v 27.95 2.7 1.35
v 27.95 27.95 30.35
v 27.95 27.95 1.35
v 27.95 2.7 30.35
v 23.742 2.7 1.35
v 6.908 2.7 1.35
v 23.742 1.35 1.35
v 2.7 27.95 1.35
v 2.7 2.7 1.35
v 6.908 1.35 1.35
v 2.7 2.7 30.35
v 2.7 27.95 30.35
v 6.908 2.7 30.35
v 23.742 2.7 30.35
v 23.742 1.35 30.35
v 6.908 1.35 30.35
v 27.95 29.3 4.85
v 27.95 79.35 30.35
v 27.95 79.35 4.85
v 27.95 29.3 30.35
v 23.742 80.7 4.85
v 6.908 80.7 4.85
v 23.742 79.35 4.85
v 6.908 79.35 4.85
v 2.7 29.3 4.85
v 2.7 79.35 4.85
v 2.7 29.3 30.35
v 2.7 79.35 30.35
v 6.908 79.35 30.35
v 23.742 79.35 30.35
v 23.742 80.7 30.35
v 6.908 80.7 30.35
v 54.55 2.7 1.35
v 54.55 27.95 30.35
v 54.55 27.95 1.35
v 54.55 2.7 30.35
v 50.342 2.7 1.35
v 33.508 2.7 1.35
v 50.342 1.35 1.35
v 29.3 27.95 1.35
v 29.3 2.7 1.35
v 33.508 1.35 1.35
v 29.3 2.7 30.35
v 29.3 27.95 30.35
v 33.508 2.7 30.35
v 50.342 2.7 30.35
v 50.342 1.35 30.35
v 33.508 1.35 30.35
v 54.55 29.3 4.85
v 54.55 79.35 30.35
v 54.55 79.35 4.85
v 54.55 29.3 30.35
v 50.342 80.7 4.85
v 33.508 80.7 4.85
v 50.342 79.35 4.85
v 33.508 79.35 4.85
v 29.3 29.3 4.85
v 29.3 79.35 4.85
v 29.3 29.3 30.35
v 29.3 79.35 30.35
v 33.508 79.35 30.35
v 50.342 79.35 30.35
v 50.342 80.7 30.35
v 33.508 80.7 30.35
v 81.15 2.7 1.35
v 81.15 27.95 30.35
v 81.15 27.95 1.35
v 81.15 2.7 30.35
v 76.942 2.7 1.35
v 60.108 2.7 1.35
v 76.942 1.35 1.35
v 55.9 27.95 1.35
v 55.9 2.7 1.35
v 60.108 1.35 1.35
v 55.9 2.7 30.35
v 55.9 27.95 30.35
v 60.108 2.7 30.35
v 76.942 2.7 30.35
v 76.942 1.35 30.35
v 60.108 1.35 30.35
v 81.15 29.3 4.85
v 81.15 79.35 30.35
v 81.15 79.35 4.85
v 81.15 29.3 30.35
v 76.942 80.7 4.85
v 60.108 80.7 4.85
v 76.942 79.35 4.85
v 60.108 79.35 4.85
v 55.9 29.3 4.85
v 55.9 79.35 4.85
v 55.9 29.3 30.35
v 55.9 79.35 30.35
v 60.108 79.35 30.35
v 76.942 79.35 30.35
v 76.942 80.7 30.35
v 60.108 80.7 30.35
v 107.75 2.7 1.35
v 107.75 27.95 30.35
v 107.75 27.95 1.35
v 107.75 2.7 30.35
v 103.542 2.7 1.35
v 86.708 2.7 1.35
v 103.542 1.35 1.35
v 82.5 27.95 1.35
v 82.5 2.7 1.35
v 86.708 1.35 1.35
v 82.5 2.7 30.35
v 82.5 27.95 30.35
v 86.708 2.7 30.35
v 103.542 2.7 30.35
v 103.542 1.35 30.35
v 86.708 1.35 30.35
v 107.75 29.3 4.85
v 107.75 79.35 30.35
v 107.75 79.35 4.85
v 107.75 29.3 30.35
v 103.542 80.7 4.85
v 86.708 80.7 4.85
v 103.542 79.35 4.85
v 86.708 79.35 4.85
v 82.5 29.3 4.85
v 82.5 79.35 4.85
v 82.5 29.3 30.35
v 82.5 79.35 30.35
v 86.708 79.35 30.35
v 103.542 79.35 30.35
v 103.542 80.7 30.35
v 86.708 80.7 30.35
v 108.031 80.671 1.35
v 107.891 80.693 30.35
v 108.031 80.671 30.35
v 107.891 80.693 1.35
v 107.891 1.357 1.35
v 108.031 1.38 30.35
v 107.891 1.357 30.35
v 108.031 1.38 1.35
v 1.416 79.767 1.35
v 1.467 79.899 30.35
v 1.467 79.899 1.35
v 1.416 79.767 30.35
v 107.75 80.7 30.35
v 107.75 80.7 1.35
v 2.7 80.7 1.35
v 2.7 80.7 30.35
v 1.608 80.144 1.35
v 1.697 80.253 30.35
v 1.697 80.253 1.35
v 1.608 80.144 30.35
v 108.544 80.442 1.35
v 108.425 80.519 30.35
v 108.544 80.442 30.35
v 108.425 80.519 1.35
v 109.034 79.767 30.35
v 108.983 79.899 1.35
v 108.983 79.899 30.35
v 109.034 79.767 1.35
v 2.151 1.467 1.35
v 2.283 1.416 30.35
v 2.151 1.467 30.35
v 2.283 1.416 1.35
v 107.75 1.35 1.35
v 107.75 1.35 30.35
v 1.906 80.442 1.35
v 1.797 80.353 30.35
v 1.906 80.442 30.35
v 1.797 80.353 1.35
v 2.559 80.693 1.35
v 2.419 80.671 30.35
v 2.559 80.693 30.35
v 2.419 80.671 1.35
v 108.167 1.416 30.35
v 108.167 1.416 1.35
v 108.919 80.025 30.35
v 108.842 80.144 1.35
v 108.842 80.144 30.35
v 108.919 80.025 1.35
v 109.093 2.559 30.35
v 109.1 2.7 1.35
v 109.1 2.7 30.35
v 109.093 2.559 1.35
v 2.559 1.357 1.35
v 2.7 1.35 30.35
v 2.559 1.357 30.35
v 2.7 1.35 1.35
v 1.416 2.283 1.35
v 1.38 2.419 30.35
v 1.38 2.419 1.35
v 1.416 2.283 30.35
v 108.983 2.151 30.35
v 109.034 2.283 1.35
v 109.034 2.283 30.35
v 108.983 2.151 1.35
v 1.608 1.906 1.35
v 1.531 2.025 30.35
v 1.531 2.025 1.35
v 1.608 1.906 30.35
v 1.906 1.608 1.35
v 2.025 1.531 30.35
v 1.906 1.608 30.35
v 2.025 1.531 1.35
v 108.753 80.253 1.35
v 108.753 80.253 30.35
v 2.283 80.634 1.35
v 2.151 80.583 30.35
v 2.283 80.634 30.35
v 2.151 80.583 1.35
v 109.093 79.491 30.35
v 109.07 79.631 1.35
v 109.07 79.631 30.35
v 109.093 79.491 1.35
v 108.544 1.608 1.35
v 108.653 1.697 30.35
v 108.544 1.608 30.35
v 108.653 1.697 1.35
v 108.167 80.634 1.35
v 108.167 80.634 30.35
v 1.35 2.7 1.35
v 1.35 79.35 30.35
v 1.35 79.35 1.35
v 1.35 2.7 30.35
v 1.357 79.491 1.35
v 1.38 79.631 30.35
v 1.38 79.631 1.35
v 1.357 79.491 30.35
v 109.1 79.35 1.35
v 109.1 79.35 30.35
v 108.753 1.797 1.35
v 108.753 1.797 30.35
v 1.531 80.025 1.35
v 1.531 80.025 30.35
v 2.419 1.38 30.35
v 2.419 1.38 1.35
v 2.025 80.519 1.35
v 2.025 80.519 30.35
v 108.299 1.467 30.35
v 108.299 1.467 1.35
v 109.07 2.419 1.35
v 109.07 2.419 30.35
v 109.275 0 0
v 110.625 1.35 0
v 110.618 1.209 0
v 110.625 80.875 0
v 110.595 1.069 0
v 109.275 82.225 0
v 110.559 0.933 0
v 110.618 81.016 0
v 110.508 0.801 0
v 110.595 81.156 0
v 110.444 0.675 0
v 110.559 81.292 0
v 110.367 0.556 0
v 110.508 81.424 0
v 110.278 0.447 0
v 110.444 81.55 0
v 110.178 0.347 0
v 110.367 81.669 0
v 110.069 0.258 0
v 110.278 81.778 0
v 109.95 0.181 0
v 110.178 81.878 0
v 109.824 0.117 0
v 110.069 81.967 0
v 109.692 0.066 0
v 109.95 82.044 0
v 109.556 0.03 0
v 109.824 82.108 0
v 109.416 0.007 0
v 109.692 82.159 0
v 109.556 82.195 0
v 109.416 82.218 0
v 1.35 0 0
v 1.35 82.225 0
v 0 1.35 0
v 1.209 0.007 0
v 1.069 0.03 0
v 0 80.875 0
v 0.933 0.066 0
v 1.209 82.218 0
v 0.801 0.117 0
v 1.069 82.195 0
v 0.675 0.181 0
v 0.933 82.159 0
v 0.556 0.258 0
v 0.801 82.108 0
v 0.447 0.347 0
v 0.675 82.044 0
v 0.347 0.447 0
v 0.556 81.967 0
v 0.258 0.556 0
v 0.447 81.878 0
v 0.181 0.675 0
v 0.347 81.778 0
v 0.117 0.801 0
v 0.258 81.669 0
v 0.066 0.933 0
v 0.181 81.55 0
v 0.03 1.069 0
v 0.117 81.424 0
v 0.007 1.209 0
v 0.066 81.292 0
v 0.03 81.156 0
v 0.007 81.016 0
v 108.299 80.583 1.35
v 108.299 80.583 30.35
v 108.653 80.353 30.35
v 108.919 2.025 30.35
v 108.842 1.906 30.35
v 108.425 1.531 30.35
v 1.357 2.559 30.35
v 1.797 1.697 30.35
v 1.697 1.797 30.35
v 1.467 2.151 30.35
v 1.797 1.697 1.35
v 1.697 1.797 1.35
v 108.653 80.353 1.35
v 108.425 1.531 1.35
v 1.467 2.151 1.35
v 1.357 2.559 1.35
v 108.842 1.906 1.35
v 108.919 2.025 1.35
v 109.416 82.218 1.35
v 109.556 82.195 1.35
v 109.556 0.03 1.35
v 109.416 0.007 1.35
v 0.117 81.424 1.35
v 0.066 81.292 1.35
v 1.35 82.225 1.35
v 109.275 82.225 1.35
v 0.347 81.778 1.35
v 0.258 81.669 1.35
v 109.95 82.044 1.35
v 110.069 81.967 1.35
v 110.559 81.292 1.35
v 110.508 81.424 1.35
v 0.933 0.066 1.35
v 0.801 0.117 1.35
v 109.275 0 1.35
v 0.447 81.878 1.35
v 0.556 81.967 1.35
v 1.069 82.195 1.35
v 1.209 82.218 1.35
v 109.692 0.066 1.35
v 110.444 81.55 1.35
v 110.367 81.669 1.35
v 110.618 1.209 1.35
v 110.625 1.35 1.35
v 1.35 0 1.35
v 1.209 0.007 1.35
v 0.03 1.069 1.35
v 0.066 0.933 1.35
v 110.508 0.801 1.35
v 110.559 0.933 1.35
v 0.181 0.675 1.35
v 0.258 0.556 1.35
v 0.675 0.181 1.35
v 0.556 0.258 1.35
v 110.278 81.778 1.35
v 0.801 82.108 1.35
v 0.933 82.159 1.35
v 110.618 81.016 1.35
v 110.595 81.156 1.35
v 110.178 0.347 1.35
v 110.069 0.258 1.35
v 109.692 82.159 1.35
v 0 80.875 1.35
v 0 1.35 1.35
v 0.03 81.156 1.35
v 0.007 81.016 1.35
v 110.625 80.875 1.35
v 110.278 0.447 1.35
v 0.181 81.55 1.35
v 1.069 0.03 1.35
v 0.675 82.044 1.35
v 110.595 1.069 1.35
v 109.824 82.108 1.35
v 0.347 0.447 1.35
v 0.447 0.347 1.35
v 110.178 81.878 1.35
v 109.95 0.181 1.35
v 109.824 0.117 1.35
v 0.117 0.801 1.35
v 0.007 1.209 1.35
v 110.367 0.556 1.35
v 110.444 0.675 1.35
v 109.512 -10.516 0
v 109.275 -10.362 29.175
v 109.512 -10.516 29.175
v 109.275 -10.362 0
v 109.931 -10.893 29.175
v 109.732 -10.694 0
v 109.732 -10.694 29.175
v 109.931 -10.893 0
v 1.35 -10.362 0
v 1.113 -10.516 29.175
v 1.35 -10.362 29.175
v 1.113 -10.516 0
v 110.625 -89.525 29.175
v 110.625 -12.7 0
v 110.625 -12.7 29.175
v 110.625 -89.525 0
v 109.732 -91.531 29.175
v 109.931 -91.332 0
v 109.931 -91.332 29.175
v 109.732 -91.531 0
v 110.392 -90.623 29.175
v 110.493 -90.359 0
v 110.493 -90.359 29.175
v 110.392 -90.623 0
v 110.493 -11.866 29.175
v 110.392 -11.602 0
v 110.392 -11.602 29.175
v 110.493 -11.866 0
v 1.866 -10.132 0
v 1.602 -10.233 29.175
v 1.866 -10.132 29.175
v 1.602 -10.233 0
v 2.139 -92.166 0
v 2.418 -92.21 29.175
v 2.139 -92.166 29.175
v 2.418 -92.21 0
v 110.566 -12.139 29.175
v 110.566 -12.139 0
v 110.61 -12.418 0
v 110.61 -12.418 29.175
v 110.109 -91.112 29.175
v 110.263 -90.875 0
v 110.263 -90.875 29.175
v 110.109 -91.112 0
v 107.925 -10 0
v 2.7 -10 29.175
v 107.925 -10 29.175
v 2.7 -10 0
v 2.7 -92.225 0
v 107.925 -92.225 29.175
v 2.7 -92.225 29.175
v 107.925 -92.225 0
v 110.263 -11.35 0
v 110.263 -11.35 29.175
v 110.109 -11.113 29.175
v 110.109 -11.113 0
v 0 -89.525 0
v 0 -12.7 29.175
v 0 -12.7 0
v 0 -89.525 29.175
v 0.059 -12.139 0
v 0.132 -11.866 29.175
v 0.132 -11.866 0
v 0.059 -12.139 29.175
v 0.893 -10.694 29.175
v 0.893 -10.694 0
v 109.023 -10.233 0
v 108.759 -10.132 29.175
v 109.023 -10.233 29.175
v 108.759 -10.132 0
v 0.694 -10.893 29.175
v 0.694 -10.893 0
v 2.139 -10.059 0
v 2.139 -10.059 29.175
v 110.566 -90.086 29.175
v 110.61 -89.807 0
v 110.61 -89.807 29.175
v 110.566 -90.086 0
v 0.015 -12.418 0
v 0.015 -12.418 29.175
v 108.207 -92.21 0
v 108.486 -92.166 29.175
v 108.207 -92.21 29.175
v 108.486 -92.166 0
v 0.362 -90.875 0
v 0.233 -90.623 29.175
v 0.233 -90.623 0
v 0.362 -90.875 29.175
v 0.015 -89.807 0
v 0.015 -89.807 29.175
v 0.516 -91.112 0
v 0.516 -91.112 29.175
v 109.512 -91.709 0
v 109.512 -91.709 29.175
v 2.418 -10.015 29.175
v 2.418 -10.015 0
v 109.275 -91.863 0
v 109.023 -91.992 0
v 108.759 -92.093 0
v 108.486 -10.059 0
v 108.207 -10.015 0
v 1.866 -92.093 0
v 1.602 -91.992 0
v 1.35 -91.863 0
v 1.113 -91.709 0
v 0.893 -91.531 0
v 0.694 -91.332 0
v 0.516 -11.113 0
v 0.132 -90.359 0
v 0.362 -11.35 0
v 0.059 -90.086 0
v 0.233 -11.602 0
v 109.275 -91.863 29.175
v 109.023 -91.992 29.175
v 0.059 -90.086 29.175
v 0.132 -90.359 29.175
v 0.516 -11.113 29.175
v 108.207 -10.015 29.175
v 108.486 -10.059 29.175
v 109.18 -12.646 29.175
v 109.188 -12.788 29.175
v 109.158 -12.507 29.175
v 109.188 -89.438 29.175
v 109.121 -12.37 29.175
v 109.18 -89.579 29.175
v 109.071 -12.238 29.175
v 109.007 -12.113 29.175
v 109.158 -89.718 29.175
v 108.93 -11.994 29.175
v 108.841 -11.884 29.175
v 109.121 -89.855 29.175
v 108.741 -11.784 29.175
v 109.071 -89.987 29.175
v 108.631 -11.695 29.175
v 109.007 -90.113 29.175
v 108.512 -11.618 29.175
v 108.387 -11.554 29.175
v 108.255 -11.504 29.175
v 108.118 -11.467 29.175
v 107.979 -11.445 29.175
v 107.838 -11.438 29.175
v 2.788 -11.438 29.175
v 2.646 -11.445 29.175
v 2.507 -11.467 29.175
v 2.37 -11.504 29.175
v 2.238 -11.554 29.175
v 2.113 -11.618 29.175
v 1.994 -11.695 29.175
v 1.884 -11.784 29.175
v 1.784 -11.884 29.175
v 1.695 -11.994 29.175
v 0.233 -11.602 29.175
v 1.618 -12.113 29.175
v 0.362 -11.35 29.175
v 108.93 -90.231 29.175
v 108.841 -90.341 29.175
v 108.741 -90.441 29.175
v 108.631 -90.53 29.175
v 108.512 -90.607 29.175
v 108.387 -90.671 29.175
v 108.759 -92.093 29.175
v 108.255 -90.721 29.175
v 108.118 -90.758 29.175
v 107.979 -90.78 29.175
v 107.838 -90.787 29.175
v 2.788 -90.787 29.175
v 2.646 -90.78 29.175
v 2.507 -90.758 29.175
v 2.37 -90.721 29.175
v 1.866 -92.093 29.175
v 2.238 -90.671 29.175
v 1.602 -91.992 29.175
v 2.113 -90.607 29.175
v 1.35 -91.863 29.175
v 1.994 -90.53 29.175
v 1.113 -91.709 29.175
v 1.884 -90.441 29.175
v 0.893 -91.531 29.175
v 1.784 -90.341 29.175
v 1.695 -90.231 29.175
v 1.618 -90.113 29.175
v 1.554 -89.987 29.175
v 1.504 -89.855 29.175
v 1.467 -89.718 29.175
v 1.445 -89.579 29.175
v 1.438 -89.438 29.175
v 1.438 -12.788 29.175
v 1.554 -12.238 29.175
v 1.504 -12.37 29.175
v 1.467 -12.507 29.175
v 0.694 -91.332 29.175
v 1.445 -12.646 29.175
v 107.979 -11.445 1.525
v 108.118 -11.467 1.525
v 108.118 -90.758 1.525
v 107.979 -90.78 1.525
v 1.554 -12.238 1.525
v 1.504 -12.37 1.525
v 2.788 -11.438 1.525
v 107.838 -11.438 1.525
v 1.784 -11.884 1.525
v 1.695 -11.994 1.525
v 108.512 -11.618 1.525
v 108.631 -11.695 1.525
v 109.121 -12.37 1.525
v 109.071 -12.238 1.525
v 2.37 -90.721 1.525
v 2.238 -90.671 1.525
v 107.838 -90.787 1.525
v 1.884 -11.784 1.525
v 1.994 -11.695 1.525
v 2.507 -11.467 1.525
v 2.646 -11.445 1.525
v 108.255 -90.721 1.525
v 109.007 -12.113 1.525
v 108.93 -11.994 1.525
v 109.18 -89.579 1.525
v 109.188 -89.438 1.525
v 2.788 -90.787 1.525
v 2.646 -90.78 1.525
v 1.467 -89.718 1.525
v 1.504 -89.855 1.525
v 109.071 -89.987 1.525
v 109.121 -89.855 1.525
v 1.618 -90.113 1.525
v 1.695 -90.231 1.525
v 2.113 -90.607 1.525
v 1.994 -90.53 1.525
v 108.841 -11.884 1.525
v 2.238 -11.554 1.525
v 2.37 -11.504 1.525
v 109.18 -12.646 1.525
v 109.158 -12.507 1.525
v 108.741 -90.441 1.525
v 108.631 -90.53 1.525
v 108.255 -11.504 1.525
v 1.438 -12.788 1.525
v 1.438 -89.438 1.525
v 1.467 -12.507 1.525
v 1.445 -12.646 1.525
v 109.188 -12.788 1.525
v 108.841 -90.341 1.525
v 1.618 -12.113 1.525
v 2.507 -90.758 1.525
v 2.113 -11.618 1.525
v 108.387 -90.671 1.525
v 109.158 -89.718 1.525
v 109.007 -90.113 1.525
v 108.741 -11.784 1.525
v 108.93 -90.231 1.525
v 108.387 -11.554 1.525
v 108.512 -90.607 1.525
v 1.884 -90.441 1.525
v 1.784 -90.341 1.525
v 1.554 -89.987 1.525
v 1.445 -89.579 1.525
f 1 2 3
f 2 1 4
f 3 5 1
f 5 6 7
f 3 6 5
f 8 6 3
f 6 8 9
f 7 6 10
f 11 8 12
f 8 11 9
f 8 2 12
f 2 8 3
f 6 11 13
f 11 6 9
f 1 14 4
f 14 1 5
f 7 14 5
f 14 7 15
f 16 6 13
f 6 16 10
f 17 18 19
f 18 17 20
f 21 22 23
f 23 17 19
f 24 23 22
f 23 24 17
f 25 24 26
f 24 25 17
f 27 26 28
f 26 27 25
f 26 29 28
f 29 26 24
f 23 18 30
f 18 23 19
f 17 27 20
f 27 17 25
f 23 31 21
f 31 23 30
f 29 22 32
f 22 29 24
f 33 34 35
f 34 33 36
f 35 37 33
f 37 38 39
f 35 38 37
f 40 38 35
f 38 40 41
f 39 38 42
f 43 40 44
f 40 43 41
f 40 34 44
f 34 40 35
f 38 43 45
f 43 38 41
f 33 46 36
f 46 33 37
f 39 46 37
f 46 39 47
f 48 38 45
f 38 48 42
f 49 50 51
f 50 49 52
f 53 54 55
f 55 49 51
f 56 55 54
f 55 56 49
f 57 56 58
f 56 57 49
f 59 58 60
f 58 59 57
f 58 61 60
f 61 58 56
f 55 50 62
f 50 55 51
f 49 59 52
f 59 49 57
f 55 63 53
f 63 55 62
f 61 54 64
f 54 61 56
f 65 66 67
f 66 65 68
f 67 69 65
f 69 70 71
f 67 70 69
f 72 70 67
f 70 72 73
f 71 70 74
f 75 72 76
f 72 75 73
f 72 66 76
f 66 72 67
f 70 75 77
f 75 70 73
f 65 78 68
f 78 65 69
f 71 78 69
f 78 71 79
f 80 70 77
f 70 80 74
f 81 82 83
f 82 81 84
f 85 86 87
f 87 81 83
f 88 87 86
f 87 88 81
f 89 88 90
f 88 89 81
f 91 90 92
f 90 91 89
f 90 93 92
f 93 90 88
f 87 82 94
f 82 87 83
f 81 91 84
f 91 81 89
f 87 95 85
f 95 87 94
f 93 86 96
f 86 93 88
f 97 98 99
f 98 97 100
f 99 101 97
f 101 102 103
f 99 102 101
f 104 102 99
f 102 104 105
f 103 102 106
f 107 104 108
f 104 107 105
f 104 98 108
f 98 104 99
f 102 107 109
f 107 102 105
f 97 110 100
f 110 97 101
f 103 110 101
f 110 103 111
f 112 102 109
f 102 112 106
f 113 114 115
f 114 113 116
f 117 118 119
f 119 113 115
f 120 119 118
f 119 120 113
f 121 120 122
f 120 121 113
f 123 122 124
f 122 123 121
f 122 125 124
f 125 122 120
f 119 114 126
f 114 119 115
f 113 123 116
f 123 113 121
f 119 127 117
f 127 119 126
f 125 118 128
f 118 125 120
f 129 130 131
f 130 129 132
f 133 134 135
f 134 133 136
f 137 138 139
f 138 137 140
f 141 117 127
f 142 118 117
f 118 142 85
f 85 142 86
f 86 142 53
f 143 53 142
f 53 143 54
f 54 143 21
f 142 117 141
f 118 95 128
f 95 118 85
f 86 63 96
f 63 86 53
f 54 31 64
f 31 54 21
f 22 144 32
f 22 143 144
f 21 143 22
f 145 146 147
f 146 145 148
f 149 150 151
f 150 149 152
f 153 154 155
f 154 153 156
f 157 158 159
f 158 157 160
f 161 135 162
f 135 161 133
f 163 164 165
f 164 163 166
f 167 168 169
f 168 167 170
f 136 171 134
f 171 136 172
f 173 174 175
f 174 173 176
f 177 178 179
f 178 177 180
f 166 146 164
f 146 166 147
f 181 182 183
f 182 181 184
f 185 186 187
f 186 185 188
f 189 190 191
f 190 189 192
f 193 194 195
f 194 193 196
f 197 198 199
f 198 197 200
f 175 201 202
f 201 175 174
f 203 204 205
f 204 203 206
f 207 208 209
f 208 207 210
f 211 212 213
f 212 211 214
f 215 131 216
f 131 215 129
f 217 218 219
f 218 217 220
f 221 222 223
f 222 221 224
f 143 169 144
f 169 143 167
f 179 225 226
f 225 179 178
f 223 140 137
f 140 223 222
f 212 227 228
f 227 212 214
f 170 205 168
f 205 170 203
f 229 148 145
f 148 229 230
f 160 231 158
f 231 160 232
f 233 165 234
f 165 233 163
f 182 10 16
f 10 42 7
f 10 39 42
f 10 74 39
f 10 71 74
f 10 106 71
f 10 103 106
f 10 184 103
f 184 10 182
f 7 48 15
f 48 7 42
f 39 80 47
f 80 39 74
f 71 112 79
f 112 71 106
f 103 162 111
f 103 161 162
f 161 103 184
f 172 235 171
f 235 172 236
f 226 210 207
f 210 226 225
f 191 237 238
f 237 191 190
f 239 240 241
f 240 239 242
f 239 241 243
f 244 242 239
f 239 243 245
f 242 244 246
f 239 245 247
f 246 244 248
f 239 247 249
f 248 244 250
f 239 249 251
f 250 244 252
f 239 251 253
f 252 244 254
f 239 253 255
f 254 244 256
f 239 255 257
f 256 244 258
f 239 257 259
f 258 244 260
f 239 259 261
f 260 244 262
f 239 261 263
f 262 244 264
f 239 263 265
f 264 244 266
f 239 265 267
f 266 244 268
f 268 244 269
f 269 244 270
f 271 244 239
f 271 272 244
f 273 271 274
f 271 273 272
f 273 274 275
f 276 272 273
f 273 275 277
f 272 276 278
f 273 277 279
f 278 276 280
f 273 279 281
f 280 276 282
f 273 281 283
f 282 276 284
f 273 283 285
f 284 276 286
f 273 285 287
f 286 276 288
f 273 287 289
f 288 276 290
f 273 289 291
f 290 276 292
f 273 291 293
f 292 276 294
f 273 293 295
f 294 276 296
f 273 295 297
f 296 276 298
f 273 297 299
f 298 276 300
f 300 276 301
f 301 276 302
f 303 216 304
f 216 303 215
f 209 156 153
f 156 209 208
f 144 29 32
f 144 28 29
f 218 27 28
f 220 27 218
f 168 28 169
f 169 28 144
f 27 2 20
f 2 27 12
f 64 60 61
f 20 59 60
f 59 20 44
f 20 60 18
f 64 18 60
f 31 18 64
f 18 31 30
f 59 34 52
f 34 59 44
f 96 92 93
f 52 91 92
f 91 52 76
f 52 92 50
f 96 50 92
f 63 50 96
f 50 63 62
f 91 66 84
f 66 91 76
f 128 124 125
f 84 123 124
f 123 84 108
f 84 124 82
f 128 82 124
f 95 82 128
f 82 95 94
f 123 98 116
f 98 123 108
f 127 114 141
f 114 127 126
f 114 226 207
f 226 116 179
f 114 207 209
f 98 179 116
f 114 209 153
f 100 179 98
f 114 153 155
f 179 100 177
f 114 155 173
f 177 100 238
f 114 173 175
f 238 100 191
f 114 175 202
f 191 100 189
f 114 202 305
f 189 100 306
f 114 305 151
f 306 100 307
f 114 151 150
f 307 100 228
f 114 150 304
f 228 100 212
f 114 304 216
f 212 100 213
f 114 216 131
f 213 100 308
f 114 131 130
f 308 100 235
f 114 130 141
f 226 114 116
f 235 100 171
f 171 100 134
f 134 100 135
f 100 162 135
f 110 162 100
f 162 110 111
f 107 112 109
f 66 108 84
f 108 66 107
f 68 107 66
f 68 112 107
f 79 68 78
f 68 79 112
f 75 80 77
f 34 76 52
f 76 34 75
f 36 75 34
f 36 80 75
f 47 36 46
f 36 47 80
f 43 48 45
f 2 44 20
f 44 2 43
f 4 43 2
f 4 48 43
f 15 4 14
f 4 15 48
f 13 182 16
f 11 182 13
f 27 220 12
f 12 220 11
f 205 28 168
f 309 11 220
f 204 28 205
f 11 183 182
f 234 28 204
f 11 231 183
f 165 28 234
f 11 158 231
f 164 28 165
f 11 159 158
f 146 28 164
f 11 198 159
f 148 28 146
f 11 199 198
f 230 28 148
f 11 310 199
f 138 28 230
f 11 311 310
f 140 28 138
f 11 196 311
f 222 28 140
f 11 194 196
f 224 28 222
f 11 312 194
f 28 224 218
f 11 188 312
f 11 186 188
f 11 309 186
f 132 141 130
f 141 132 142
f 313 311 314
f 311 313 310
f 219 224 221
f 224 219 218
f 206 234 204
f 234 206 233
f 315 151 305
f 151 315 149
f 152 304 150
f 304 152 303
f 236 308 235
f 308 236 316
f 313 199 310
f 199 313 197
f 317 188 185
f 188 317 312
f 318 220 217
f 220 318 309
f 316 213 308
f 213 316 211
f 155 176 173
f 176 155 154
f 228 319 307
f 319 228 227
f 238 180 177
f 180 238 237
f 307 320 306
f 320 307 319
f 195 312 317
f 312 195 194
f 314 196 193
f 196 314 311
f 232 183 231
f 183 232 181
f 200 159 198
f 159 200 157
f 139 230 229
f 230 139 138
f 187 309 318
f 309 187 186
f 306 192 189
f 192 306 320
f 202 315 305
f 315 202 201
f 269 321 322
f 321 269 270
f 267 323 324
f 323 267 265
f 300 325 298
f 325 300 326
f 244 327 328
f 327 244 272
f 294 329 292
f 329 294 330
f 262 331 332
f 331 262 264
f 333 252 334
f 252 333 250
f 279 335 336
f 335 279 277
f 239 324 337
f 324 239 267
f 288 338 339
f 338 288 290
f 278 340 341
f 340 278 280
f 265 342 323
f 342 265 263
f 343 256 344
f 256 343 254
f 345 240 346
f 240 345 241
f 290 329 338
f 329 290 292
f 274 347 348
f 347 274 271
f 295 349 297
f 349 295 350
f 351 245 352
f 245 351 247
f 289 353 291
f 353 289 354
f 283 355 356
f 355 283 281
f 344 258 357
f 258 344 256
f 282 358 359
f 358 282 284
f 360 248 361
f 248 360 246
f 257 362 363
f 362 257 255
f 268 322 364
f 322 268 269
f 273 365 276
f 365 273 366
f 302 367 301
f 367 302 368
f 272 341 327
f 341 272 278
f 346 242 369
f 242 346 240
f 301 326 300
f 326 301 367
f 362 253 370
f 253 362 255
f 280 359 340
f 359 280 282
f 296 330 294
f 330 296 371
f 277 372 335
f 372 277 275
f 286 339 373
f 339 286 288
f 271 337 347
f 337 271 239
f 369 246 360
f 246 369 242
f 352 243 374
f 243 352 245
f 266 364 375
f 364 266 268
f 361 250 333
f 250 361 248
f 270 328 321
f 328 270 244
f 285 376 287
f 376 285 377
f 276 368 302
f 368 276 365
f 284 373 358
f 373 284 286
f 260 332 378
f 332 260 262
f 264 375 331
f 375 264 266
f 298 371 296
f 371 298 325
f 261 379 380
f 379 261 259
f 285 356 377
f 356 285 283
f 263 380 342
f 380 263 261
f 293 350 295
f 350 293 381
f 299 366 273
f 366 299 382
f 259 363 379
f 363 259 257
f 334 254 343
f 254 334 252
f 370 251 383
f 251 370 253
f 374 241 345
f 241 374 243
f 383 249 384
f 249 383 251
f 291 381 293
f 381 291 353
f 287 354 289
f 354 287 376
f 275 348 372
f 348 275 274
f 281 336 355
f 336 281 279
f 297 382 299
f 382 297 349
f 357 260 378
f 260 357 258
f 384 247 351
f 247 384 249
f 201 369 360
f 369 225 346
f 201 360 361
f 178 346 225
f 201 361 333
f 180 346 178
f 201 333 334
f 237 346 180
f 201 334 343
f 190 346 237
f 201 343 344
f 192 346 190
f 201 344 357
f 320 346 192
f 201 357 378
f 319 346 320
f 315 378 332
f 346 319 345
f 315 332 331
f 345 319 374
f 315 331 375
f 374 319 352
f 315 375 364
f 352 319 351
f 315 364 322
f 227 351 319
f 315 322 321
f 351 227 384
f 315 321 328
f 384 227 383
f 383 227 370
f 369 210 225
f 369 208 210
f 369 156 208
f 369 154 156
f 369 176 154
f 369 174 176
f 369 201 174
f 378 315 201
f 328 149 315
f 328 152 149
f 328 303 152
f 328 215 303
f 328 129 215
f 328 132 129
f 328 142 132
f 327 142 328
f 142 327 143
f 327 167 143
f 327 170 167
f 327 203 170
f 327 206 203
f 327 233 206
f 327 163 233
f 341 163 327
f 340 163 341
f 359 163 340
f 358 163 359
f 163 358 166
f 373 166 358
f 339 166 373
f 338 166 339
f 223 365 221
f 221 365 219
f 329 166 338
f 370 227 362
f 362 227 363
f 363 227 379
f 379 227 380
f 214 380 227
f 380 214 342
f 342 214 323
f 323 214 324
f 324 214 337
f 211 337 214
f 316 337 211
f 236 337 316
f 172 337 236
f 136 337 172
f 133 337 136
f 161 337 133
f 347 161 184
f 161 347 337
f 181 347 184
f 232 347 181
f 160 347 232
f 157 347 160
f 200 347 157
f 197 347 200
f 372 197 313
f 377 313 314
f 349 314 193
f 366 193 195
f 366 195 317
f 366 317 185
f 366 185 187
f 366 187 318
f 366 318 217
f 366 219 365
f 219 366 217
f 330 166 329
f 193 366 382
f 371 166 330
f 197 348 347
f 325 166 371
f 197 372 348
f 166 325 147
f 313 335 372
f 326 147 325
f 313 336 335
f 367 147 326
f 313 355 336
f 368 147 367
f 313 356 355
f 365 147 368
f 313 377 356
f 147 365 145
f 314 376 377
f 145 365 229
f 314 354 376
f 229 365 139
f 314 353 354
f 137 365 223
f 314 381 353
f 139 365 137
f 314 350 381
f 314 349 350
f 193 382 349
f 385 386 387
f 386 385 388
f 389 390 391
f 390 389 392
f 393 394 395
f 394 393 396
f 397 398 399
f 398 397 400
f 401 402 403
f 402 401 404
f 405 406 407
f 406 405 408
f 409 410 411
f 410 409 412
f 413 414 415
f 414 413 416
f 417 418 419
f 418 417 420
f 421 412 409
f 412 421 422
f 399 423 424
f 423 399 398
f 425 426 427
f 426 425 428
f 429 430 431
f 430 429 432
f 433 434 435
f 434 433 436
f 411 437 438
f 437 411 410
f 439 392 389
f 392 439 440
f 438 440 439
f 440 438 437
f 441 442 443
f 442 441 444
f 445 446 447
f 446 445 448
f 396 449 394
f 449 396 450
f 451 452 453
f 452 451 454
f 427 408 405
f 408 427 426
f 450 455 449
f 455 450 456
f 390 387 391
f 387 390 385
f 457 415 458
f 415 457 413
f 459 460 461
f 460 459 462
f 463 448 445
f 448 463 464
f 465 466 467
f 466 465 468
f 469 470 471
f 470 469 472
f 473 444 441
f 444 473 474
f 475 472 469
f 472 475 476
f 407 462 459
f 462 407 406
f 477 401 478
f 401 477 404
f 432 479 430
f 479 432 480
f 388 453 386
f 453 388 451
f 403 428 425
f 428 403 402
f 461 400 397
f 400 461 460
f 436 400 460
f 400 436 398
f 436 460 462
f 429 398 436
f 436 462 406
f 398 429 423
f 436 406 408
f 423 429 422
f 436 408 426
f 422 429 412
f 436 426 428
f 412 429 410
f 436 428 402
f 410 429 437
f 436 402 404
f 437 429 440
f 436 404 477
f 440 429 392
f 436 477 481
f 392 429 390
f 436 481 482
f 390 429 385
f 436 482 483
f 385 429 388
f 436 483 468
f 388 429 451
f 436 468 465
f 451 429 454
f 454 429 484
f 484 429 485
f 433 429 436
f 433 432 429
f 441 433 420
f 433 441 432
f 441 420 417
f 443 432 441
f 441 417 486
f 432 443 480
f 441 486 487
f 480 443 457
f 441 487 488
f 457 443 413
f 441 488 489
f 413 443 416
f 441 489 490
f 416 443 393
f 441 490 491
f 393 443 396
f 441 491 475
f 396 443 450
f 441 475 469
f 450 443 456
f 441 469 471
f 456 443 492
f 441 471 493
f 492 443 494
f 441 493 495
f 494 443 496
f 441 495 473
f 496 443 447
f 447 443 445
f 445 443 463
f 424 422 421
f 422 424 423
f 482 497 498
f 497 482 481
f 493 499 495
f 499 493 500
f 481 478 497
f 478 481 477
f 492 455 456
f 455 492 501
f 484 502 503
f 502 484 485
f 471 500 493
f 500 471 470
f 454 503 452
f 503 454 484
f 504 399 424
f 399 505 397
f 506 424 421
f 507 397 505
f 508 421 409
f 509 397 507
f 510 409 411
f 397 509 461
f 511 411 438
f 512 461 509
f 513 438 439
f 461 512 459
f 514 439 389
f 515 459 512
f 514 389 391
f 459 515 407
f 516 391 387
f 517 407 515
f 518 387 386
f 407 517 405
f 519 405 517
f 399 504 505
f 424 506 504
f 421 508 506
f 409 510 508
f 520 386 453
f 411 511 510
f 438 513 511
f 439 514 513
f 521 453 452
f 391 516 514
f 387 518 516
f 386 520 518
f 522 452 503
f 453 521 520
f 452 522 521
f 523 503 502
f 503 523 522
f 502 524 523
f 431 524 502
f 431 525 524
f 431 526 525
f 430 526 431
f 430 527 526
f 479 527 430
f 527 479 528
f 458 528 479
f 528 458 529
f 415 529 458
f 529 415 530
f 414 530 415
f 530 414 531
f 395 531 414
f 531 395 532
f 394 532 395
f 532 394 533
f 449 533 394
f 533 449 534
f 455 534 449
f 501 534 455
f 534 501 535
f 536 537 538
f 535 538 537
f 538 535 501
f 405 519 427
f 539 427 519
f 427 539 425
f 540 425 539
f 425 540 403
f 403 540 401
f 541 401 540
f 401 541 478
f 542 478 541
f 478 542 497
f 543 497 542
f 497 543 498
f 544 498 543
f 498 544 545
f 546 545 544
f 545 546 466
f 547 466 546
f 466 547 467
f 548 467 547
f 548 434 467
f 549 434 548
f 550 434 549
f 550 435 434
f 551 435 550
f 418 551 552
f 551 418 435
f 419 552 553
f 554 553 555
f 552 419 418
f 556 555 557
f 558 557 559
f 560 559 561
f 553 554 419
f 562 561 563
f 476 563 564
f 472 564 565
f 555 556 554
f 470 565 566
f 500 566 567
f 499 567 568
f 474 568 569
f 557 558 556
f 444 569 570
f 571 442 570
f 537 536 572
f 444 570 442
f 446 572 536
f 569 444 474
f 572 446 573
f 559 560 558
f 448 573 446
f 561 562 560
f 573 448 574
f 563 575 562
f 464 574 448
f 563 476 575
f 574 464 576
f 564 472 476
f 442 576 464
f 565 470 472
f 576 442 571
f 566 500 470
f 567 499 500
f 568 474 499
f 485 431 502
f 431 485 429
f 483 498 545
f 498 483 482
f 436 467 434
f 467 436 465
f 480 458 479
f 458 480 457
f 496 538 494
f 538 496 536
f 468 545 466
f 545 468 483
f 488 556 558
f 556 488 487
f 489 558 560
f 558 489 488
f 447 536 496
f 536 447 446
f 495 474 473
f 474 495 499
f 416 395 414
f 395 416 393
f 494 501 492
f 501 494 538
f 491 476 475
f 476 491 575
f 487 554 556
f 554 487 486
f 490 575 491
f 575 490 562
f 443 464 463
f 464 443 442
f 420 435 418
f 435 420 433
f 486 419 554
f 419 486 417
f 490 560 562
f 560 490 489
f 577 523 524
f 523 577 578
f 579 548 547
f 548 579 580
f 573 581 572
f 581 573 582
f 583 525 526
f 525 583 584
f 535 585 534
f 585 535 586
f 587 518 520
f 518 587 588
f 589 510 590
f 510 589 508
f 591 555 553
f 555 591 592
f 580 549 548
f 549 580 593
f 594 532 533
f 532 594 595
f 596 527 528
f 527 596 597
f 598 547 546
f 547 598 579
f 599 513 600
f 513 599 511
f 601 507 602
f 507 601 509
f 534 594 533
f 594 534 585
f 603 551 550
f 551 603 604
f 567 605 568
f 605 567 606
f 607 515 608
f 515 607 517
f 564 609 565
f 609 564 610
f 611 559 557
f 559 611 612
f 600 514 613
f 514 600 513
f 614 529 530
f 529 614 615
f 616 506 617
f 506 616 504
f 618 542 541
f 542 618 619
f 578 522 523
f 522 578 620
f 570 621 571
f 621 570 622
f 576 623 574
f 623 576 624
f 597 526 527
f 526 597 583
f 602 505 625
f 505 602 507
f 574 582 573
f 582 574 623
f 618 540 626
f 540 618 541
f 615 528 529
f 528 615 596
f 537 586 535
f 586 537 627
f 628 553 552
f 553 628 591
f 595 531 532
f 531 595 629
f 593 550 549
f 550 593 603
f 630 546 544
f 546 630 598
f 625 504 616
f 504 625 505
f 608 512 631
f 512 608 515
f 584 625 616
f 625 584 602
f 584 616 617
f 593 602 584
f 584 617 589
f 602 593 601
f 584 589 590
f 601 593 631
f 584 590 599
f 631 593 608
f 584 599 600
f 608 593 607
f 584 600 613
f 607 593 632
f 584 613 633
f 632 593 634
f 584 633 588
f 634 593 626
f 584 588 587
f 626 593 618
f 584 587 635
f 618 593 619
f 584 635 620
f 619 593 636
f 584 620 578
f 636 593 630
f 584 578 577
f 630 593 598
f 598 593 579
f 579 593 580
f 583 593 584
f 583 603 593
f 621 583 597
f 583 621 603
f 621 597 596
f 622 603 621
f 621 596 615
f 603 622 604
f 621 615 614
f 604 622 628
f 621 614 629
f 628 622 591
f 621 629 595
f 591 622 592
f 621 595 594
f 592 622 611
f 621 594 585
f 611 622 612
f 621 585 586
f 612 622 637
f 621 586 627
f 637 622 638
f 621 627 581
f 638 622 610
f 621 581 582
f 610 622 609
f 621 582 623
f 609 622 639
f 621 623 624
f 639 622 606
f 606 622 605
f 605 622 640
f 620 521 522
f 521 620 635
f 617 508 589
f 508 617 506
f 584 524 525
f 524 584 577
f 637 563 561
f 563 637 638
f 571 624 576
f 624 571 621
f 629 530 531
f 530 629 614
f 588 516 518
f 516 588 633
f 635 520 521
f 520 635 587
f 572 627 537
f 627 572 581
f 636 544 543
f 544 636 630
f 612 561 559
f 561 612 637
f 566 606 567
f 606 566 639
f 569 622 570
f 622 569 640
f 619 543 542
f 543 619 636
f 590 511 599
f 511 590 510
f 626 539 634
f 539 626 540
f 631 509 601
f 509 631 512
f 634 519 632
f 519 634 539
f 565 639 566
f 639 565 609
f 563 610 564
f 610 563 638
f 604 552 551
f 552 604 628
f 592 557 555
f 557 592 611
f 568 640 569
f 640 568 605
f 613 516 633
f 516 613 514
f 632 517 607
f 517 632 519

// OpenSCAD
// file: common.scad
/*

    This program is free software: you can redistribute it and/or modify it under the terms of the GNU General Public License as published by the Free Software Foundation, either version 3 of the License, or (at your option) any later version.

    This program is distributed in the hope that it will be useful, but WITHOUT ANY WARRANTY; without even the implied warranty of MERCHANTABILITY or FITNESS FOR A PARTICULAR PURPOSE.  See the GNU General Public License for more details.

    You should have received a copy of the GNU General Public License along with this program.  If not, see <https://www.gnu.org/licenses/gpl-3.0.txt>
*/

/**********************
includes
**********************/


/**********************
globals
**********************/
e = .1;
DEBUG = 2;


/**********************
renders (should be empty)
**********************/
//ring_arc(10,2,3,135,center=true,round_end=true);
echo(central_align_vector([1,1,1],[4,4,4]));

/**********************
functions
**********************/
// create a scale vector so that a part of <size> has some gaps around it
function neg_scaling_vector(size, gap=e) = [for(i=[0:2]) (size[i] + 2*gap) / size[i]];

// provide a scaling vector to make an object of size_o match the final size (size_f)
function linear_scaling_vector(size_o, size_f) = [for(i=[0:2]) (size_f[i])/size_o[i]];
  
// provide a vector to align the centers of o1 to o2, assuming they are located at the origin in the positive octant
function central_align_vector(o1, o2) = (o2-o1)/2;
/**********************
part modules
**********************/
module ring_arc(d_in, t, hgt, a=0, center=false, round_end=false) {
  /*
  param d_in: inner diameter of the ring
  param t: thickness of the ring
  param hgt: height of the ring
  param a: angle of the ring to cut out
  param center: bool
  param round_end: bool, should the cut ends of the ring be rounded?
  */
  d_out=d_in+2*t;
  
  a_90s=floor(a/90);
  
  tran = !center ? [d_out/2,d_out/2,0] : [0,0,0];
  translate(tran) {
    difference() {
      cylinder(h=hgt, d=d_out);
      
      translate([0,0,-e/2]) {
        cylinder(h=hgt+e, d=d_in);
      
        // cut out 90 degree chunks first
        if (a_90s>0) {
          for (i=[1:a_90s]) {
            rotate([0,0,90*i])
            cube(d_out+e);
          }
        }
        
        //cutout the subchunks by putting cubes at 3 points
        if (a>0) {
          rotate([0,0,90*(a_90s)])
          linear_extrude(hgt+e)
          polygon([[0,0],[0,d_out],[-tan(a-90*a_90s)*d_out,d_out]]);
        }
      }
    }
    
    // add rounded edges if we need them
    if (round_end) {
      for (i=[0,a]) {
        rotate([0,0,i])
        translate([0,d_in/2+(d_out-d_in)/4,0])
        cylinder(hgt, d=(d_out-d_in)/2, true);
      }
    }
  }
}

module cup (d_in, t, hgt, center=false) {
  /*
  param d_in: inner diameter of the cup
  param t: thickness of the floor and walls
  param hgt: height of the cup
  param center: bool, center the whole thing?
  */
  difference() {
    cylinder (h=hgt, r=d_in/2+t, center=center);
    translate([0,0,t]) cylinder (h=hgt, r=d_in/2, center=center);
  }
}

module r_fcube (size, rad, center=false) {
  /*
  flattened rounded cube - all of the edges around the z axis are rounded, the rest are square
  param size: [x,y,z] size
  parma rad: r for all corners [q1, q2, q3, q4] for the quandrant radii
  remember q1 is the positive x,y, q2 is +y, -x, ...
  */
  r = (len(rad) == undef) ?
        [for (i=[0:3]) minr(rad,size)] : [for (i=[0:3]) minr(rad[i], size)];
  tr = center ? [0,0,0] : size/2;
  q = [[+1, +1], [-1,1], [-1,-1], [1,-1]];
  translate(tr)
  hull () {
    for (i=[0:3]) {
      translate([q[i].x*size.x/2, q[i].y*size.y/2,0])
      if (r[i] == 0) {
        translate([-q[i].x*size.x/4, -q[i].y*size.y/4,0]) cube([size.x/2, size.y/2, size.z], center=true);
      } else {
        translate([-q[i].x*r[i],-q[i].y*r[i],0]) cylinder(h=size.z, r=r[i], center=true);
      }
    }
  }
}

function minr(r,size) = min(r, size.x/2, size.y/2);
// main file
/*

    This program is free software: you can redistribute it and/or modify it under the terms of the GNU General Public License as published by the Free Software Foundation, either version 3 of the License, or (at your option) any later version.

    This program is distributed in the hope that it will be useful, but WITHOUT ANY WARRANTY; without even the implied warranty of MERCHANTABILITY or FITNESS FOR A PARTICULAR PURPOSE.  See the GNU General Public License for more details.

    You should have received a copy of the GNU General Public License along with this program.  If not, see <https://www.gnu.org/licenses/gpl-3.0.txt>
*/

/**********************
includes
**********************/
use <common.scad>

/**********************
globals
**********************/
e = 0.1;
DEBUG=0;
$fn=60;
t_wall = 0.45*3;

/**********************
renders
**********************/
forum_trajanum_buildings("bottom");
forum_trajanum_buildings("lid");


/**********************
part modules
**********************/
module forum_trajanum_buildings(type="bottom") {
  /* bins for forum trajanum buildings*/
  sm_side = 25 + .25;
  lg_side = 49.8 + .25;
  size_sm = [sm_side, sm_side, 29];
  size_lg = [sm_side, lg_side, 25.5];
  size_shell = [sm_side*4+t_wall*5, sm_side+lg_side+t_wall*3, max(size_sm.z,size_lg.z)+t_wall];
  e_lid = .175;
  size_lid = size_shell + [t_wall*2+e_lid, t_wall*2+e_lid, e_lid-t_wall];
  
  if (type=="bottom") {
    translate([t_wall,t_wall,0])
    difference () {
      // main shell
      r_fcube(size_shell,t_wall);
      
      // part compartments
      for (i=[0:3]) {
        for (j=[0:1]) {
          // bins
          translate([t_wall + i*(size_sm.x+t_wall), t_wall + j*(size_sm.y+t_wall), size_shell.z])
          translate([0,0,-(j==0 ? size_sm.z : size_lg.z)]) {
            // bins
            cube((j==0 ? size_sm : size_lg));
            
            //front cutouts
            translate([sm_side/6,lg_side/2*(j==0?-1:1),0])
            scale ([2/3,1,1])
            cube((j==0 ? size_sm: size_lg));
          }
        }
      }
    }
    
    r_fcube([size_lid.x, size_lid.y,t_wall], t_wall);
  }
  else if (type == "lid") {
    translate([0,-size_lid.y-10,0])
    difference() {
      r_fcube(size_lid, t_wall*2);
      
      translate([t_wall+e_lid/2, t_wall+e_lid/2, t_wall+e_lid])
      r_fcube(size_shell, t_wall);
    }
  }
}
